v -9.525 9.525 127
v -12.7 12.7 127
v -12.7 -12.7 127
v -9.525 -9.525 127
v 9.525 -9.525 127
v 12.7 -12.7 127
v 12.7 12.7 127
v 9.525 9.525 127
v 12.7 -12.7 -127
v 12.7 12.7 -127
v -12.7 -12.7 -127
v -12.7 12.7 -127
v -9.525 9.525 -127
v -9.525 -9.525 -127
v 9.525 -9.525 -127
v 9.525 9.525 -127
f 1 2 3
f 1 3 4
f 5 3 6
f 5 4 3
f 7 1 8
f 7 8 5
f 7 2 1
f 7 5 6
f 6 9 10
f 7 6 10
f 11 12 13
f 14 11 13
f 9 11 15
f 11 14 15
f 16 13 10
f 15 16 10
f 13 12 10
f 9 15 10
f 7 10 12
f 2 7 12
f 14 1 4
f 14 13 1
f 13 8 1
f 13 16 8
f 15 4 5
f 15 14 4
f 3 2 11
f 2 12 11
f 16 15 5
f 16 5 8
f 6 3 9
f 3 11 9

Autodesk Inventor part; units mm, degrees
ref_plane "YZ Plane" through (0, 0, 0) normal (1, 0, 0) x (0, 1, 0)
ref_plane "XZ Plane" through (0, 0, 0) normal (0, 1, 0) x (-1, 0, 0)
ref_plane "XY Plane" through (0, 0, 0) normal (0, 0, 1) x (1, 0, 0)
sketch "Sketch1" plane through (0, 0, 0) normal (0, 0, 1) x (1, 0, 0)
  line L0 (-12.7, -12.7) -> (12.7, -12.7)
  line L1 (12.7, -12.7) -> (12.7, 12.7)
  line L2 (12.7, 12.7) -> (-12.7, 12.7)
  line L3 (-12.7, 12.7) -> (-12.7, -12.7)
  line L4 (-12.7, -12.7) -> (12.7, 12.7) construction
  line L5 (12.7, -12.7) -> (-12.7, 12.7) construction
  line L6 (-9.525, -9.525) -> (9.525, -9.525)
  line L7 (9.525, -9.525) -> (9.525, 9.525)
  line L8 (9.525, 9.525) -> (-9.525, 9.525)
  line L9 (-9.525, 9.525) -> (-9.525, -9.525)
  line L10 (-9.525, -9.525) -> (9.525, 9.525) construction
  line L11 (9.525, -9.525) -> (-9.525, 9.525) construction
  point P0 (0, 0)
  dimension "d0" = 25.4
  dimension "d1" = 25.4
  dimension "d2" = 3.175
  dimension "d3" = 3.175
extrude "Extrusion1" add sketch "Sketch1" along normal mid plane 254
properties part number "10-inchAluminumTubing"
